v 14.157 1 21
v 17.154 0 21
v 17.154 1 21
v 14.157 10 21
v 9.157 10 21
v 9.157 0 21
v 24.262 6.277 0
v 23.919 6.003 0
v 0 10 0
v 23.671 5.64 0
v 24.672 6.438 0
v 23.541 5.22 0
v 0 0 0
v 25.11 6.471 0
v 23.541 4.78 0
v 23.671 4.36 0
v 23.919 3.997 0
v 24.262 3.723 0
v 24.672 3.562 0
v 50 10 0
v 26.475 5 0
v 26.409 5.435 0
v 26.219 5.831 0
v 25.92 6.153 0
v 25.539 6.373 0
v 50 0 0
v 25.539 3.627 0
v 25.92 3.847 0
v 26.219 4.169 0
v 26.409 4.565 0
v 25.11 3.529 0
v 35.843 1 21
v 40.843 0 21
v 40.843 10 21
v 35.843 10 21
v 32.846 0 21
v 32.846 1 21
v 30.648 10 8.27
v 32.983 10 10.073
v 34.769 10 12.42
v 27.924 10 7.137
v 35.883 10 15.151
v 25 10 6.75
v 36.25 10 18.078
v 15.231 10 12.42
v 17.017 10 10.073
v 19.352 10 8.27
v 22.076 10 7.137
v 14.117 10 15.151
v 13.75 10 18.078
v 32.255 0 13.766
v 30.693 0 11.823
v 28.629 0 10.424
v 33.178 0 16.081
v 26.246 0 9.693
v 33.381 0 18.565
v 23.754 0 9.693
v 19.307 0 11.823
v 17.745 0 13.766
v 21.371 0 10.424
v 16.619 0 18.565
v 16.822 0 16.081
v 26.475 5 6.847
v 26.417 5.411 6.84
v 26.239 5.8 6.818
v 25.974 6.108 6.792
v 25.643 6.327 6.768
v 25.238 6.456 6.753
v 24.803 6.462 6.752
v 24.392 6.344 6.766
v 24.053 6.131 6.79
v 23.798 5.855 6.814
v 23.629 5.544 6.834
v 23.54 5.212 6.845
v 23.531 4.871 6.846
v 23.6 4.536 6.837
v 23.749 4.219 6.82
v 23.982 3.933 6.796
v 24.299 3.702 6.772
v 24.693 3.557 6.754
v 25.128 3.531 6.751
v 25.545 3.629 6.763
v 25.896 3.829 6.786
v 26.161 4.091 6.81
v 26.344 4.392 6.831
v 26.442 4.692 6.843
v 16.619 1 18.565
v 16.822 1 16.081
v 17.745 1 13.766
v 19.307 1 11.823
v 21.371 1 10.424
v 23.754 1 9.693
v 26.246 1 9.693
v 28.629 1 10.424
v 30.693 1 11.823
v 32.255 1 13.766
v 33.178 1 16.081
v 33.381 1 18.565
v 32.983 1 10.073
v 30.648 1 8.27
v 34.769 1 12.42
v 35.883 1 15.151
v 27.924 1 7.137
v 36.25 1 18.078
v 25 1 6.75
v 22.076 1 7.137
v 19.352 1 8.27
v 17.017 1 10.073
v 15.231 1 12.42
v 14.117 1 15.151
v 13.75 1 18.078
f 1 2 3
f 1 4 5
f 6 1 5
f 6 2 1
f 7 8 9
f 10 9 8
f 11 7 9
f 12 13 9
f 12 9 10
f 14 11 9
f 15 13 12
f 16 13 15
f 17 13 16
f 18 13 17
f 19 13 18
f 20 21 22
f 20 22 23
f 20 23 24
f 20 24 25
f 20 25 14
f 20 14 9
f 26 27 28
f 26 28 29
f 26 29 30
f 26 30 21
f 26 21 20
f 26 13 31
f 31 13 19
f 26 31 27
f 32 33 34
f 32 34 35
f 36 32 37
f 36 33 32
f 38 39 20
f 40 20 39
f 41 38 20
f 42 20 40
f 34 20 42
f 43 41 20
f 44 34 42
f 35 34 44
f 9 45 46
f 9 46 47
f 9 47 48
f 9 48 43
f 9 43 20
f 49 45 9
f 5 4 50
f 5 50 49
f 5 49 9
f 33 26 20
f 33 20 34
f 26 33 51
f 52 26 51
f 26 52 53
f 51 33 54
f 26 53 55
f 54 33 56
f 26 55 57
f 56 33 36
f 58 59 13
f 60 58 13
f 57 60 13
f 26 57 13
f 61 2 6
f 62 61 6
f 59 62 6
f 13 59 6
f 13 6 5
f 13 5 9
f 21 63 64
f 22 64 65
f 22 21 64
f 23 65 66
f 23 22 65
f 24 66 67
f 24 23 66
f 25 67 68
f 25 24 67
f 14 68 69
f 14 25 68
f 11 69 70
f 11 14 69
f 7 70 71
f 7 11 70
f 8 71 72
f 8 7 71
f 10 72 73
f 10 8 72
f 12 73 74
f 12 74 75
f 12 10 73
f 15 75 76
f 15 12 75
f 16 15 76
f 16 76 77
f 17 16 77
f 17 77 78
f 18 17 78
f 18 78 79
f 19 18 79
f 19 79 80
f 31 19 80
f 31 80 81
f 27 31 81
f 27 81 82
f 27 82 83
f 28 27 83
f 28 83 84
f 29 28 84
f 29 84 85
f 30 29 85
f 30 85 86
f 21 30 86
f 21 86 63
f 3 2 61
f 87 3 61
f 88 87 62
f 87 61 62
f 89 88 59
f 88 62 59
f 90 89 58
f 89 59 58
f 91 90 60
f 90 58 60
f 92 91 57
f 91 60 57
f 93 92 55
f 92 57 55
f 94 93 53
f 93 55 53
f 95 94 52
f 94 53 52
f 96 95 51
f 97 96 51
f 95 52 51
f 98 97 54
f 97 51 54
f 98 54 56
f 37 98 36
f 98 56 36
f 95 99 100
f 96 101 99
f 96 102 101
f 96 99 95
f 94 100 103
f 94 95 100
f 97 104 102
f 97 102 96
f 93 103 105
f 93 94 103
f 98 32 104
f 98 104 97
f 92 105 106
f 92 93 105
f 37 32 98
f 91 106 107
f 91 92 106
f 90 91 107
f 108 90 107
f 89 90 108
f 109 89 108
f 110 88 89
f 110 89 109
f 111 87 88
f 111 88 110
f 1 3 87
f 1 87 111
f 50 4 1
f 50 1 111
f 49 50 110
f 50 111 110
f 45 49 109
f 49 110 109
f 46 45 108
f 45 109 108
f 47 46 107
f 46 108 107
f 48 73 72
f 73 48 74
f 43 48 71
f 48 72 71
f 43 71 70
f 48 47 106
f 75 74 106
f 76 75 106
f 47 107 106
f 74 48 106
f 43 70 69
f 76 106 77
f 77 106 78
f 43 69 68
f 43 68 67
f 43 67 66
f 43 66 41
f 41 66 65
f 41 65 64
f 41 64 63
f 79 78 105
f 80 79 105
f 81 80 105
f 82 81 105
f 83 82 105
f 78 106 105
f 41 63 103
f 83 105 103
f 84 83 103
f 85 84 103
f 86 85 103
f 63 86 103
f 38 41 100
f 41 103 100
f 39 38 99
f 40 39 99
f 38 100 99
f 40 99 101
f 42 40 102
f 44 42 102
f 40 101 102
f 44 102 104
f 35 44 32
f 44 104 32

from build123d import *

# Parameters (mm, degrees)
PAD001_DEPTH = 1
PAD012_DEPTH = 10
SKETCH012_R  = 1.475
POCKET_DEPTH = 50


with BuildPart() as part:
    # Sketch001 → Pad001 (new body)
    with BuildSketch(Plane.XZ):
        with BuildLine():
            ThreePointArc((17.153982, 21), (25, 9.6), (32.846018, 21))
            Line((36.846018, 21), (32.846018, 21))
            Line((50, 0), (36.846018, 21))
            Line((0, 0), (50, 0))
            Line((13.153982, 21), (0, 0))
            Line((17.153982, 21), (13.153982, 21))
        make_face()
    extrude(amount=-PAD001_DEPTH)

    # Sketch011 → Pad012 (join)
    with BuildSketch(Plane.XZ):
        with BuildLine():
            ThreePointArc((14.157376, 21), (25, 6.75), (35.842624, 21))
            Line((40.842624, 21), (35.842624, 21))
            Line((50, 0), (40.842624, 21))
            Line((0, 0), (50, 0))
            Line((9.157376, 21), (0, 0))
            Line((14.157376, 21), (9.157376, 21))
        make_face()
    extrude(amount=-PAD012_DEPTH)

    # Sketch012 → Pocket (cut)
    with BuildSketch(Plane.XY):
        with Locations((25, 5)):
            Circle(SKETCH012_R)
    extrude(amount=POCKET_DEPTH, mode=Mode.SUBTRACT)


solid = part.part
